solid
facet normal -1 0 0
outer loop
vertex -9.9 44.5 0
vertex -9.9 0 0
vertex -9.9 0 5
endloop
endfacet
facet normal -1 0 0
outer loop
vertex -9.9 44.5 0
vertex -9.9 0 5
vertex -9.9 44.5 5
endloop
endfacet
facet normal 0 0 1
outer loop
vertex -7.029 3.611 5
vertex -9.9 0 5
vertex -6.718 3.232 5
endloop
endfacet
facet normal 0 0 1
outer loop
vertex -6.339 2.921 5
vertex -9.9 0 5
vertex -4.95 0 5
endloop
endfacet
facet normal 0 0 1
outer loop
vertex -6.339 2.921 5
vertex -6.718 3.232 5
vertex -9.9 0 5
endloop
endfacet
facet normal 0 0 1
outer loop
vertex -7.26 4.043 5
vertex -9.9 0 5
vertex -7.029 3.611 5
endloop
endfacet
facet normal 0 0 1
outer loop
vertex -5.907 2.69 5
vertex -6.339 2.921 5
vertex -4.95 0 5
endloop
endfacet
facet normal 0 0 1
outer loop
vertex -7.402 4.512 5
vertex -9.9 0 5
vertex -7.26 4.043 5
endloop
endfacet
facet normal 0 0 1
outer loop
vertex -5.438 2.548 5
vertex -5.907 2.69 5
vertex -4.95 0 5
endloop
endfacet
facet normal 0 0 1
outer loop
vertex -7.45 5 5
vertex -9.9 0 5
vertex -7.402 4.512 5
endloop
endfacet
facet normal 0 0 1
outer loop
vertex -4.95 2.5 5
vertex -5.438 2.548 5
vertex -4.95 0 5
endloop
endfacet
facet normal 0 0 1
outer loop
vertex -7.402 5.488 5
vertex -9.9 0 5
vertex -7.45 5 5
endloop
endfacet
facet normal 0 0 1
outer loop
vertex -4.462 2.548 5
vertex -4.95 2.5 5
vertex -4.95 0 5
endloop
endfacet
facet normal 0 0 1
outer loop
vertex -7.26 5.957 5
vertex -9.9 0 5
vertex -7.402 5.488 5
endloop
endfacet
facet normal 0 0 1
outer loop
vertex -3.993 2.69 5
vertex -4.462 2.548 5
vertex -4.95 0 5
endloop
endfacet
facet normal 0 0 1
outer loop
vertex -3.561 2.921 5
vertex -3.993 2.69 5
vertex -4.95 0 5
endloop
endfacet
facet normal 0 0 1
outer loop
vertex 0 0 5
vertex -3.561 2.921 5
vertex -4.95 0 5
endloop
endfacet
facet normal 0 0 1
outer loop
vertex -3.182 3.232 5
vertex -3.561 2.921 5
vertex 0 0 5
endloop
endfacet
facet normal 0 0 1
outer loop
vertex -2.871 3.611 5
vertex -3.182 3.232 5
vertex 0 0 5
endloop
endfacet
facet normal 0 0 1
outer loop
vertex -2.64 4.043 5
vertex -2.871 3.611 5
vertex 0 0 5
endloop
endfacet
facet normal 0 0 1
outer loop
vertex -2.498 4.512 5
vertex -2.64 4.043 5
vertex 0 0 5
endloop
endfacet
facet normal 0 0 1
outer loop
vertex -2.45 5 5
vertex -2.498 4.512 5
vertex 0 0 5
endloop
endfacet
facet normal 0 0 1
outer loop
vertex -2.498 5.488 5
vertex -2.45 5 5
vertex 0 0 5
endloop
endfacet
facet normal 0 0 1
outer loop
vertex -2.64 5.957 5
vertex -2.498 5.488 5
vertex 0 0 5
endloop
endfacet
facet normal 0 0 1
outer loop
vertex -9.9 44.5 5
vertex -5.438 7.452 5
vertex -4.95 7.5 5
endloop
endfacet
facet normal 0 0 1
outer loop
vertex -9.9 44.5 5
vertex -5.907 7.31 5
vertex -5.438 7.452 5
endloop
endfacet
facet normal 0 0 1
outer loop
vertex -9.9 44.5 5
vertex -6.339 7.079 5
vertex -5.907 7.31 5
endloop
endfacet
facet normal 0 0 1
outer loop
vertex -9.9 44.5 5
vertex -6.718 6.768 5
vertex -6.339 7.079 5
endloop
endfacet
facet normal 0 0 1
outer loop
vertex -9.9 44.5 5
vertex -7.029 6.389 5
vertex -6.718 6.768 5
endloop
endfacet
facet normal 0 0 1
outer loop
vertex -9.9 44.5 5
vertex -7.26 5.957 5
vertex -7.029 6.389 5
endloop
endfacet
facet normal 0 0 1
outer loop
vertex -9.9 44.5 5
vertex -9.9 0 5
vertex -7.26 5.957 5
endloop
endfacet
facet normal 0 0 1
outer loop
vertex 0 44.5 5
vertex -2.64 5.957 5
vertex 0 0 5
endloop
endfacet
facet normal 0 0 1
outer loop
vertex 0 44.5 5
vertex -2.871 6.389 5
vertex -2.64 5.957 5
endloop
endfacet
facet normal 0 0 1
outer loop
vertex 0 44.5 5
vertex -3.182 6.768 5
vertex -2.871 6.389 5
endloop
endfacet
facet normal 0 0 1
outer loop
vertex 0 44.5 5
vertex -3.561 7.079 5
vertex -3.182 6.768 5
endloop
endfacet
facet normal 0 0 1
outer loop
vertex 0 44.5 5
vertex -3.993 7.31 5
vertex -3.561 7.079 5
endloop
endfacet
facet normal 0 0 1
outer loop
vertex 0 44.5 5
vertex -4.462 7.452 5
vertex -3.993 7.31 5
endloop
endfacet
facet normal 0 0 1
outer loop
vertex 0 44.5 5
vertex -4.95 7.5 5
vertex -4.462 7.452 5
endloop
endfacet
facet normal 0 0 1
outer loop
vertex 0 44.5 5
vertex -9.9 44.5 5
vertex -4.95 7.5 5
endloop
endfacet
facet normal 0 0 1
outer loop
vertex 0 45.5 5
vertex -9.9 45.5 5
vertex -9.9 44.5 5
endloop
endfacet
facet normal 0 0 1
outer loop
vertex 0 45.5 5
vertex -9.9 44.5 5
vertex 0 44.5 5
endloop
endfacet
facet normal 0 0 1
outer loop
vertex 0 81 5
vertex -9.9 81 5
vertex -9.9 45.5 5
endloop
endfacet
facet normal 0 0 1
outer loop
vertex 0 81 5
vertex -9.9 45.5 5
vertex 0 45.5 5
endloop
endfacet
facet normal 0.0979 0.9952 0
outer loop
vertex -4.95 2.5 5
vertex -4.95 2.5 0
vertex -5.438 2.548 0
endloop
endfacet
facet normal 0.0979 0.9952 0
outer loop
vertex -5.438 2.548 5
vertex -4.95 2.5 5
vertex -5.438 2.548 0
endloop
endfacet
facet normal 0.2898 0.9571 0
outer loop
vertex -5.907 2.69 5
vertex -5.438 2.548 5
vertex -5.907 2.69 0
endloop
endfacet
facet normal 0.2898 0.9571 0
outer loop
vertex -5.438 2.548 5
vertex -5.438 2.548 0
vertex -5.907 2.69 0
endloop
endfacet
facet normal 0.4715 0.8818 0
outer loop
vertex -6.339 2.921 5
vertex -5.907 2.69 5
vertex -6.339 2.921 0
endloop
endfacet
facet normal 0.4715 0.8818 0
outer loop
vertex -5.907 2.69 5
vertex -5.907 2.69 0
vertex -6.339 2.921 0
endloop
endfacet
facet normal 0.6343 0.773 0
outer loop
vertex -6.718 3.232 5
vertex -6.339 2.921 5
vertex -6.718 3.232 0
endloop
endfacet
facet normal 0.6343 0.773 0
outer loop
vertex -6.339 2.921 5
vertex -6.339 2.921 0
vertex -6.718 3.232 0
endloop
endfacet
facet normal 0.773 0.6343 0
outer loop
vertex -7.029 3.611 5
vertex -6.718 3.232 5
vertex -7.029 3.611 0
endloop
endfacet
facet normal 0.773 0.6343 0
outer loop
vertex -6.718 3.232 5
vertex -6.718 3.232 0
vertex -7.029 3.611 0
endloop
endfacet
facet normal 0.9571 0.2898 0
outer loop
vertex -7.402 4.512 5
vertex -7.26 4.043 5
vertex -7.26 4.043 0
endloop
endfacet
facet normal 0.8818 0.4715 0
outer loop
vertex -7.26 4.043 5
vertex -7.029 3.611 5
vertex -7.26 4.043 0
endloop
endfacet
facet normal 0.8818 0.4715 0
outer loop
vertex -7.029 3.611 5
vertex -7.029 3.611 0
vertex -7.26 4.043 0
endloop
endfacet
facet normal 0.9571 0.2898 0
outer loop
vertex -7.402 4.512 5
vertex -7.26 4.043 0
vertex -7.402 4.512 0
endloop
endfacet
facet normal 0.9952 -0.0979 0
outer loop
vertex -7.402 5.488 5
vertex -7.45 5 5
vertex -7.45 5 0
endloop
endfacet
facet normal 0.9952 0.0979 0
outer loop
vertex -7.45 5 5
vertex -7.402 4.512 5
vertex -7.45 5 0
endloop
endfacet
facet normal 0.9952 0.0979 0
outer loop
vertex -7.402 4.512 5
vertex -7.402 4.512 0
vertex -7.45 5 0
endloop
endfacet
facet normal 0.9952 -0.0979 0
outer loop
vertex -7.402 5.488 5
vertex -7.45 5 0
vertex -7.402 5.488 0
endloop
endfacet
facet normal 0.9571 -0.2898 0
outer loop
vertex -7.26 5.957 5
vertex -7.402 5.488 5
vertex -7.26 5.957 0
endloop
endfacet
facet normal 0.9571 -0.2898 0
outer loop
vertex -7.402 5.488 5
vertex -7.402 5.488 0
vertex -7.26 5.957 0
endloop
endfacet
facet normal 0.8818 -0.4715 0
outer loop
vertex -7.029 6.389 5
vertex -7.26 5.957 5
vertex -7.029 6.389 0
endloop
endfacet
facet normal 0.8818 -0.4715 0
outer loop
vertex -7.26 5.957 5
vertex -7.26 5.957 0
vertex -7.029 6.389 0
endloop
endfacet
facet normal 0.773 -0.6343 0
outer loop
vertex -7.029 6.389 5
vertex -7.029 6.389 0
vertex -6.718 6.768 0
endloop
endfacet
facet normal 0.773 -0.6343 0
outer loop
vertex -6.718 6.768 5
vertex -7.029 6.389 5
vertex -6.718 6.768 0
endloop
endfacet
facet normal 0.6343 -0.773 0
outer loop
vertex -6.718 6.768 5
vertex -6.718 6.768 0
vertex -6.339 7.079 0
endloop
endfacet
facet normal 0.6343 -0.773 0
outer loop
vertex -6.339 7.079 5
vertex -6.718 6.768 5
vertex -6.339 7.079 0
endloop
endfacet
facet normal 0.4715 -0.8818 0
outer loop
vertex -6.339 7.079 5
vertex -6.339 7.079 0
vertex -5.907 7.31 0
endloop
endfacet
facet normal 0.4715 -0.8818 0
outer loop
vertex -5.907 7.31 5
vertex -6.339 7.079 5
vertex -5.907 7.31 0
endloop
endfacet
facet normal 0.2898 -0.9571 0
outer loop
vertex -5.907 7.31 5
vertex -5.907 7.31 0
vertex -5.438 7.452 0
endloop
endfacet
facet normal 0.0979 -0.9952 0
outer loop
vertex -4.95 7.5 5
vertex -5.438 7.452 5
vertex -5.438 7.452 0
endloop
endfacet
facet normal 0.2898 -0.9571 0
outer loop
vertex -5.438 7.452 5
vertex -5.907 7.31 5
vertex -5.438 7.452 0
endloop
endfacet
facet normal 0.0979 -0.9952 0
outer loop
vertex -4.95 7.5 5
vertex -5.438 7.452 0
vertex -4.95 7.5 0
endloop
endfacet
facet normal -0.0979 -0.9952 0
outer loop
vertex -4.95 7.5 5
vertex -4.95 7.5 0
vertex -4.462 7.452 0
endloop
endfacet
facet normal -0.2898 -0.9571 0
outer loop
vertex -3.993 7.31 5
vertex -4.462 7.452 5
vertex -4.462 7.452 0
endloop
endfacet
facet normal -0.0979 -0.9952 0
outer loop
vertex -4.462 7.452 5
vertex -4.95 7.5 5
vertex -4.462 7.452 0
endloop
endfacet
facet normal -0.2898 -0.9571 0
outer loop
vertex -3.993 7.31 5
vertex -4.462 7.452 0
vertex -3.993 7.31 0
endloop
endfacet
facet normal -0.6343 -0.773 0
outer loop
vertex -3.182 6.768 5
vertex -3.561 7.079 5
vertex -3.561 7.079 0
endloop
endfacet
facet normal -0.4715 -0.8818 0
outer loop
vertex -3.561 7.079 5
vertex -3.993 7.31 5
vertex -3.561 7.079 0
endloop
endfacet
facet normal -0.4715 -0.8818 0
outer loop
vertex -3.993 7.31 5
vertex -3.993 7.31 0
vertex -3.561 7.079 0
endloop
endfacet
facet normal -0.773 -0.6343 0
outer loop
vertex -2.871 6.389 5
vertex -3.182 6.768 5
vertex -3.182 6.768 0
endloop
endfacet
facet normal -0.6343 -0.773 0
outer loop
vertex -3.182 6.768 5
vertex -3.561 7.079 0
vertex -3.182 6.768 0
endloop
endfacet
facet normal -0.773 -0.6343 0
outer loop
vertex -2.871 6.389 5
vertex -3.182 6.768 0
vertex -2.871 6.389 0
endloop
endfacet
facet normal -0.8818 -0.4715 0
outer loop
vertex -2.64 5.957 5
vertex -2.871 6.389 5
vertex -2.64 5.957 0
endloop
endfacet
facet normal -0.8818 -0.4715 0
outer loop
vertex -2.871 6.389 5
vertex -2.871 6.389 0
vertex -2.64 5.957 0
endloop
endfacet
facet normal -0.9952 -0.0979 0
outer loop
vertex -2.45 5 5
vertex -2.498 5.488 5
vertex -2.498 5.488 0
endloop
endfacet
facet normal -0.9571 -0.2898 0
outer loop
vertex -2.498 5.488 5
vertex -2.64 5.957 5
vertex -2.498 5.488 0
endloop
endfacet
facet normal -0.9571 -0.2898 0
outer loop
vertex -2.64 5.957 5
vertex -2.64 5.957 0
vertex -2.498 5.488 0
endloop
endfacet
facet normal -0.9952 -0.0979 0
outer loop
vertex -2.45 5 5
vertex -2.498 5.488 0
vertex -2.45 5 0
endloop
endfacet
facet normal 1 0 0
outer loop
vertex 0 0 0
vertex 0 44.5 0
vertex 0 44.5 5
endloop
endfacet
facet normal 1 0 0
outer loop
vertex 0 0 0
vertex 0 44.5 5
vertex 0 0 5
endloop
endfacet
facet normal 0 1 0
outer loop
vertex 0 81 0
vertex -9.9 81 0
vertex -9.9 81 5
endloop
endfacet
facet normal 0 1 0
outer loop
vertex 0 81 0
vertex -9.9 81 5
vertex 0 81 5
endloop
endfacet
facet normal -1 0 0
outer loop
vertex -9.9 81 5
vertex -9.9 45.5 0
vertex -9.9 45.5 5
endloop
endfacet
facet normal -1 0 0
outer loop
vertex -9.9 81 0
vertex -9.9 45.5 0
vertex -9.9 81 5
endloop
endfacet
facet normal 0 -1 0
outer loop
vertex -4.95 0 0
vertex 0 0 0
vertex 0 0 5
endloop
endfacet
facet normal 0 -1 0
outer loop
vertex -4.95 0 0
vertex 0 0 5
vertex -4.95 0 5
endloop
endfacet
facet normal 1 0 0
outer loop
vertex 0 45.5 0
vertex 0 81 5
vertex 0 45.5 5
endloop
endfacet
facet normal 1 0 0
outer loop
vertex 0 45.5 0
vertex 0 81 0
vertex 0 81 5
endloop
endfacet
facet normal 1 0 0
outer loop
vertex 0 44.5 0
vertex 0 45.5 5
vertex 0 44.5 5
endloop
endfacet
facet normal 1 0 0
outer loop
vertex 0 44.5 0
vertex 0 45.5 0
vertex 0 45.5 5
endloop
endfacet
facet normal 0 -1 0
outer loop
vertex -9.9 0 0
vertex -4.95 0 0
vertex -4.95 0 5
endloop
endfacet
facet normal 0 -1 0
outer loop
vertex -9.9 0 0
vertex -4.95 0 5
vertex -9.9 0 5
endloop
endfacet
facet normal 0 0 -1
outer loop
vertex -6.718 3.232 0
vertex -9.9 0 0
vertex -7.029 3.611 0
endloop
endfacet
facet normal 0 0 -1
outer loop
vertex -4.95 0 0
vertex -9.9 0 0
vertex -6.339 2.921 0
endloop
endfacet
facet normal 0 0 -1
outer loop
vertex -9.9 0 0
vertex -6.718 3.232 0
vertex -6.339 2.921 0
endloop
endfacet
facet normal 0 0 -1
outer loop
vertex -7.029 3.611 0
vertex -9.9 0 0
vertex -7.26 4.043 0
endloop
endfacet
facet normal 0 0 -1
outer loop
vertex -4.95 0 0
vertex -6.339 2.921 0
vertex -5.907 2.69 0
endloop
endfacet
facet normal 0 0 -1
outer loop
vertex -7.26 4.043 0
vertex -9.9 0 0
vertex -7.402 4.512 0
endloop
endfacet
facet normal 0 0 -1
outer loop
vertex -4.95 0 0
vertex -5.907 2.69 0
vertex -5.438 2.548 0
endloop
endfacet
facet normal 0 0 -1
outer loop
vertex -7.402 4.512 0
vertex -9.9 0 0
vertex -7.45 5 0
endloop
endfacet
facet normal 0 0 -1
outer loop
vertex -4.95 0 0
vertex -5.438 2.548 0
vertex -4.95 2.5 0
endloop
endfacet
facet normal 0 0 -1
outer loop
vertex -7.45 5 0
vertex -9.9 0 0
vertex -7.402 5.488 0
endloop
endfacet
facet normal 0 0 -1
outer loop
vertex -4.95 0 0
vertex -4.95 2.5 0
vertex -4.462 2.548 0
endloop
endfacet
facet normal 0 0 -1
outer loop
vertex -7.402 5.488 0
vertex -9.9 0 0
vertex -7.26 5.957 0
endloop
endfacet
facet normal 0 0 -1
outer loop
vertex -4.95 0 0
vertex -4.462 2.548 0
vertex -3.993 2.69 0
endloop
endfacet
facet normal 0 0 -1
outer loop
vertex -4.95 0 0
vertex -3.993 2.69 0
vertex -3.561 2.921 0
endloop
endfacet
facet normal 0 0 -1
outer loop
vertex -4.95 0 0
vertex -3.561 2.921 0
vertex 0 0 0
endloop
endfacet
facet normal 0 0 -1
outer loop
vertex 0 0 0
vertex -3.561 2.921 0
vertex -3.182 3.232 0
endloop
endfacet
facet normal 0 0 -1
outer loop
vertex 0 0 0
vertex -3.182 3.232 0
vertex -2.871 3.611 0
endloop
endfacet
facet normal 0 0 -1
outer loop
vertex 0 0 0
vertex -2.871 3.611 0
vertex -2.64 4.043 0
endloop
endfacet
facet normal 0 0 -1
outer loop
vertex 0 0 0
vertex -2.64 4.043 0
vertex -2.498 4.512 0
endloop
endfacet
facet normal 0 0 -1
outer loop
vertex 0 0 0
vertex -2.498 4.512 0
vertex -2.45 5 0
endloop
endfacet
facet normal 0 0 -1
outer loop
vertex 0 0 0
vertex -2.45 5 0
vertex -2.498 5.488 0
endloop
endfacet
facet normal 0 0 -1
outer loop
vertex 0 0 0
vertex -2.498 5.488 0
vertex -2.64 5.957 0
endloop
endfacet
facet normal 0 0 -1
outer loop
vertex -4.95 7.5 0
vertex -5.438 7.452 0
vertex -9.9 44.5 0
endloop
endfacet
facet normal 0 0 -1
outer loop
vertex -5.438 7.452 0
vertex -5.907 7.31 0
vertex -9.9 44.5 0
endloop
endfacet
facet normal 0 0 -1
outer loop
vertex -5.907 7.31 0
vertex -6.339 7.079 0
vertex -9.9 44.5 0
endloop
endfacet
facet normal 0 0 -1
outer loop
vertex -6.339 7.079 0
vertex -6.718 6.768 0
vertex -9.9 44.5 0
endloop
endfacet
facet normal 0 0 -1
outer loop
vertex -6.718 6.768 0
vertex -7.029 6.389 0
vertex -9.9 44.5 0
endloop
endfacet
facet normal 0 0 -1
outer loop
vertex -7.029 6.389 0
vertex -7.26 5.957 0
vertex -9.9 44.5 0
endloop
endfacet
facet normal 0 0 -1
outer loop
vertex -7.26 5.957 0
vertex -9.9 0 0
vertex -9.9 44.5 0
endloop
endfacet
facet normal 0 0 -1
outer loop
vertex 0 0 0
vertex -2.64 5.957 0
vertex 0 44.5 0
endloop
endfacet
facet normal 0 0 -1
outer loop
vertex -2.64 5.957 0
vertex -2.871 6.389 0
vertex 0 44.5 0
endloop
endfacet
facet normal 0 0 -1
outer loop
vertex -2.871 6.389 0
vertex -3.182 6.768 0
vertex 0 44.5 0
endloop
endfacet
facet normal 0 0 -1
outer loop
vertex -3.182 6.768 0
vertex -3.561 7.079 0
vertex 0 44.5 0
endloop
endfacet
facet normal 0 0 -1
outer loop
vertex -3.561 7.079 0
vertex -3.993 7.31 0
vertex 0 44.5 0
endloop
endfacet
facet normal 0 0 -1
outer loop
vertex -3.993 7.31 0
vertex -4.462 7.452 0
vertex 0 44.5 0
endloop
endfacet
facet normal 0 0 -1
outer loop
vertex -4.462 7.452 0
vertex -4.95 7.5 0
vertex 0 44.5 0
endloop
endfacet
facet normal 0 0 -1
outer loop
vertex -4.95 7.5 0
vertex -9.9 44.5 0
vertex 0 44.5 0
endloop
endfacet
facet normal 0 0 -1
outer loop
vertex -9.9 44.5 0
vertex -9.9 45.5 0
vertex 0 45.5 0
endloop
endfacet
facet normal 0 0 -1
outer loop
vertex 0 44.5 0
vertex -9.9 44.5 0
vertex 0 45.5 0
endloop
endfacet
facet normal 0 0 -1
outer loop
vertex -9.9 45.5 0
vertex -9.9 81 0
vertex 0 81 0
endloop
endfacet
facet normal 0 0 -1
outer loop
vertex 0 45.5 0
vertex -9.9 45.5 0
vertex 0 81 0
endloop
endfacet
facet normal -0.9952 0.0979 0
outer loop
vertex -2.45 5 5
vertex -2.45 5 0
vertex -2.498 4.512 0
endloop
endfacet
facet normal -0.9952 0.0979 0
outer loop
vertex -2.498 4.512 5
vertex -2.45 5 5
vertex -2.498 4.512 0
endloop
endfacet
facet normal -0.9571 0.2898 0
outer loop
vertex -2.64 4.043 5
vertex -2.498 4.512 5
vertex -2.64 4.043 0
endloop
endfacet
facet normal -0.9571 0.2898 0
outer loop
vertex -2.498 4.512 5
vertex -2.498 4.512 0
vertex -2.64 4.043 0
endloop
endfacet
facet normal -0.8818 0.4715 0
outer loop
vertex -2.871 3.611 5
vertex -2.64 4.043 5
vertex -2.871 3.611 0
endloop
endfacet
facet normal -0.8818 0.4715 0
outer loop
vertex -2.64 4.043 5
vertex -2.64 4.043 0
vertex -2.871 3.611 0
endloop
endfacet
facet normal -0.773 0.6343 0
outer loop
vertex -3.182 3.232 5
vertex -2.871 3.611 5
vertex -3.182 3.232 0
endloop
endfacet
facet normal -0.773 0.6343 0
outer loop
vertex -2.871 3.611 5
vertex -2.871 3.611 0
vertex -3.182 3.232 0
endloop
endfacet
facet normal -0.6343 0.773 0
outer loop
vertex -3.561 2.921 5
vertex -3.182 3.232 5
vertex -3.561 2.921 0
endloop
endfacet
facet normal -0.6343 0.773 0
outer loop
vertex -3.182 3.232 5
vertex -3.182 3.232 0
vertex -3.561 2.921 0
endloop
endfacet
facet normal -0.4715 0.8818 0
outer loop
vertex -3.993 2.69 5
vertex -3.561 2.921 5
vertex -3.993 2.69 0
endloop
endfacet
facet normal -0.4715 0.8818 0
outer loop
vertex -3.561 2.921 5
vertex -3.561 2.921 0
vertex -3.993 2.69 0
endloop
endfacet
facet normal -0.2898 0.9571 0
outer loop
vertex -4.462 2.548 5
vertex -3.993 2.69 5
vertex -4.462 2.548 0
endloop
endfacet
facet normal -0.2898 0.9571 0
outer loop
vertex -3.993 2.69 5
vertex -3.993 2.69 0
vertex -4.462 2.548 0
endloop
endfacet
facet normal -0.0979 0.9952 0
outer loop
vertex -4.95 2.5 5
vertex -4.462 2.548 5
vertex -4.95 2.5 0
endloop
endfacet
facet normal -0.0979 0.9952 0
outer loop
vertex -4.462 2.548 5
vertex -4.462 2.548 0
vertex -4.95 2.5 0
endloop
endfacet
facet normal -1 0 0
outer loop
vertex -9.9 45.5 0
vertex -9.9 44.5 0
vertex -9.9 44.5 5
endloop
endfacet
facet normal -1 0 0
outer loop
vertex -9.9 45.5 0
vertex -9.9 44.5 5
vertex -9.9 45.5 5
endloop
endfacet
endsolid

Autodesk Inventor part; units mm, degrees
ref_plane "YZ Plane" through (0, 0, 0) normal (1, 0, 0) x (0, 1, 0)
ref_plane "XZ Plane" through (0, 0, 0) normal (0, 1, 0) x (-1, 0, 0)
ref_plane "XY Plane" through (0, 0, 0) normal (0, 0, 1) x (1, 0, 0)
sketch "Sketch2" plane through (0, 0, 0) normal (0, 0, 1) x (1, 0, 0)
  line L0 (0, 0) -> (-9.9, 0)
  line L1 (-4.95, 0) -> (-4.95, 2.5)
  line L2 (-4.95, 0) -> (-2.45, 0) construction
  circle A0 centre (-4.95, 5) radius 2.5
  line L3 (-4.95, 7.5) -> (32.05, 7.5) construction
  line L4 (0, 44.5) -> (0, 0)
  line L5 (0, 0) -> (-9.9, 0)
  line L6 (-9.9, 0) -> (-9.9, 44.5)
  line L7 (0, 45.5) -> (0, 0)
  line L8 (0, 0) -> (-9.9, 0)
  line L9 (-9.9, 0) -> (-9.9, 45.5)
  line L10 (-4.95, 7.5) -> (66.05, 7.5) construction
  line L11 (0, 0) -> (-9.9, 0)
  line L12 (-9.9, 0) -> (-9.9, 81)
  line L13 (-9.9, 81) -> (0, 81)
  line L14 (0, 81) -> (0, 0)
  dimension "d35" = 5
  dimension "d33" = 2.5
  dimension "d34" = 90
  dimension "d46" = 9.9
  dimension "d47" = 81
extrude "Extrusion6" add sketch "Sketch2" along normal blind 5
properties part number "Elbow_Cube_Holder_TestFit_V2"
